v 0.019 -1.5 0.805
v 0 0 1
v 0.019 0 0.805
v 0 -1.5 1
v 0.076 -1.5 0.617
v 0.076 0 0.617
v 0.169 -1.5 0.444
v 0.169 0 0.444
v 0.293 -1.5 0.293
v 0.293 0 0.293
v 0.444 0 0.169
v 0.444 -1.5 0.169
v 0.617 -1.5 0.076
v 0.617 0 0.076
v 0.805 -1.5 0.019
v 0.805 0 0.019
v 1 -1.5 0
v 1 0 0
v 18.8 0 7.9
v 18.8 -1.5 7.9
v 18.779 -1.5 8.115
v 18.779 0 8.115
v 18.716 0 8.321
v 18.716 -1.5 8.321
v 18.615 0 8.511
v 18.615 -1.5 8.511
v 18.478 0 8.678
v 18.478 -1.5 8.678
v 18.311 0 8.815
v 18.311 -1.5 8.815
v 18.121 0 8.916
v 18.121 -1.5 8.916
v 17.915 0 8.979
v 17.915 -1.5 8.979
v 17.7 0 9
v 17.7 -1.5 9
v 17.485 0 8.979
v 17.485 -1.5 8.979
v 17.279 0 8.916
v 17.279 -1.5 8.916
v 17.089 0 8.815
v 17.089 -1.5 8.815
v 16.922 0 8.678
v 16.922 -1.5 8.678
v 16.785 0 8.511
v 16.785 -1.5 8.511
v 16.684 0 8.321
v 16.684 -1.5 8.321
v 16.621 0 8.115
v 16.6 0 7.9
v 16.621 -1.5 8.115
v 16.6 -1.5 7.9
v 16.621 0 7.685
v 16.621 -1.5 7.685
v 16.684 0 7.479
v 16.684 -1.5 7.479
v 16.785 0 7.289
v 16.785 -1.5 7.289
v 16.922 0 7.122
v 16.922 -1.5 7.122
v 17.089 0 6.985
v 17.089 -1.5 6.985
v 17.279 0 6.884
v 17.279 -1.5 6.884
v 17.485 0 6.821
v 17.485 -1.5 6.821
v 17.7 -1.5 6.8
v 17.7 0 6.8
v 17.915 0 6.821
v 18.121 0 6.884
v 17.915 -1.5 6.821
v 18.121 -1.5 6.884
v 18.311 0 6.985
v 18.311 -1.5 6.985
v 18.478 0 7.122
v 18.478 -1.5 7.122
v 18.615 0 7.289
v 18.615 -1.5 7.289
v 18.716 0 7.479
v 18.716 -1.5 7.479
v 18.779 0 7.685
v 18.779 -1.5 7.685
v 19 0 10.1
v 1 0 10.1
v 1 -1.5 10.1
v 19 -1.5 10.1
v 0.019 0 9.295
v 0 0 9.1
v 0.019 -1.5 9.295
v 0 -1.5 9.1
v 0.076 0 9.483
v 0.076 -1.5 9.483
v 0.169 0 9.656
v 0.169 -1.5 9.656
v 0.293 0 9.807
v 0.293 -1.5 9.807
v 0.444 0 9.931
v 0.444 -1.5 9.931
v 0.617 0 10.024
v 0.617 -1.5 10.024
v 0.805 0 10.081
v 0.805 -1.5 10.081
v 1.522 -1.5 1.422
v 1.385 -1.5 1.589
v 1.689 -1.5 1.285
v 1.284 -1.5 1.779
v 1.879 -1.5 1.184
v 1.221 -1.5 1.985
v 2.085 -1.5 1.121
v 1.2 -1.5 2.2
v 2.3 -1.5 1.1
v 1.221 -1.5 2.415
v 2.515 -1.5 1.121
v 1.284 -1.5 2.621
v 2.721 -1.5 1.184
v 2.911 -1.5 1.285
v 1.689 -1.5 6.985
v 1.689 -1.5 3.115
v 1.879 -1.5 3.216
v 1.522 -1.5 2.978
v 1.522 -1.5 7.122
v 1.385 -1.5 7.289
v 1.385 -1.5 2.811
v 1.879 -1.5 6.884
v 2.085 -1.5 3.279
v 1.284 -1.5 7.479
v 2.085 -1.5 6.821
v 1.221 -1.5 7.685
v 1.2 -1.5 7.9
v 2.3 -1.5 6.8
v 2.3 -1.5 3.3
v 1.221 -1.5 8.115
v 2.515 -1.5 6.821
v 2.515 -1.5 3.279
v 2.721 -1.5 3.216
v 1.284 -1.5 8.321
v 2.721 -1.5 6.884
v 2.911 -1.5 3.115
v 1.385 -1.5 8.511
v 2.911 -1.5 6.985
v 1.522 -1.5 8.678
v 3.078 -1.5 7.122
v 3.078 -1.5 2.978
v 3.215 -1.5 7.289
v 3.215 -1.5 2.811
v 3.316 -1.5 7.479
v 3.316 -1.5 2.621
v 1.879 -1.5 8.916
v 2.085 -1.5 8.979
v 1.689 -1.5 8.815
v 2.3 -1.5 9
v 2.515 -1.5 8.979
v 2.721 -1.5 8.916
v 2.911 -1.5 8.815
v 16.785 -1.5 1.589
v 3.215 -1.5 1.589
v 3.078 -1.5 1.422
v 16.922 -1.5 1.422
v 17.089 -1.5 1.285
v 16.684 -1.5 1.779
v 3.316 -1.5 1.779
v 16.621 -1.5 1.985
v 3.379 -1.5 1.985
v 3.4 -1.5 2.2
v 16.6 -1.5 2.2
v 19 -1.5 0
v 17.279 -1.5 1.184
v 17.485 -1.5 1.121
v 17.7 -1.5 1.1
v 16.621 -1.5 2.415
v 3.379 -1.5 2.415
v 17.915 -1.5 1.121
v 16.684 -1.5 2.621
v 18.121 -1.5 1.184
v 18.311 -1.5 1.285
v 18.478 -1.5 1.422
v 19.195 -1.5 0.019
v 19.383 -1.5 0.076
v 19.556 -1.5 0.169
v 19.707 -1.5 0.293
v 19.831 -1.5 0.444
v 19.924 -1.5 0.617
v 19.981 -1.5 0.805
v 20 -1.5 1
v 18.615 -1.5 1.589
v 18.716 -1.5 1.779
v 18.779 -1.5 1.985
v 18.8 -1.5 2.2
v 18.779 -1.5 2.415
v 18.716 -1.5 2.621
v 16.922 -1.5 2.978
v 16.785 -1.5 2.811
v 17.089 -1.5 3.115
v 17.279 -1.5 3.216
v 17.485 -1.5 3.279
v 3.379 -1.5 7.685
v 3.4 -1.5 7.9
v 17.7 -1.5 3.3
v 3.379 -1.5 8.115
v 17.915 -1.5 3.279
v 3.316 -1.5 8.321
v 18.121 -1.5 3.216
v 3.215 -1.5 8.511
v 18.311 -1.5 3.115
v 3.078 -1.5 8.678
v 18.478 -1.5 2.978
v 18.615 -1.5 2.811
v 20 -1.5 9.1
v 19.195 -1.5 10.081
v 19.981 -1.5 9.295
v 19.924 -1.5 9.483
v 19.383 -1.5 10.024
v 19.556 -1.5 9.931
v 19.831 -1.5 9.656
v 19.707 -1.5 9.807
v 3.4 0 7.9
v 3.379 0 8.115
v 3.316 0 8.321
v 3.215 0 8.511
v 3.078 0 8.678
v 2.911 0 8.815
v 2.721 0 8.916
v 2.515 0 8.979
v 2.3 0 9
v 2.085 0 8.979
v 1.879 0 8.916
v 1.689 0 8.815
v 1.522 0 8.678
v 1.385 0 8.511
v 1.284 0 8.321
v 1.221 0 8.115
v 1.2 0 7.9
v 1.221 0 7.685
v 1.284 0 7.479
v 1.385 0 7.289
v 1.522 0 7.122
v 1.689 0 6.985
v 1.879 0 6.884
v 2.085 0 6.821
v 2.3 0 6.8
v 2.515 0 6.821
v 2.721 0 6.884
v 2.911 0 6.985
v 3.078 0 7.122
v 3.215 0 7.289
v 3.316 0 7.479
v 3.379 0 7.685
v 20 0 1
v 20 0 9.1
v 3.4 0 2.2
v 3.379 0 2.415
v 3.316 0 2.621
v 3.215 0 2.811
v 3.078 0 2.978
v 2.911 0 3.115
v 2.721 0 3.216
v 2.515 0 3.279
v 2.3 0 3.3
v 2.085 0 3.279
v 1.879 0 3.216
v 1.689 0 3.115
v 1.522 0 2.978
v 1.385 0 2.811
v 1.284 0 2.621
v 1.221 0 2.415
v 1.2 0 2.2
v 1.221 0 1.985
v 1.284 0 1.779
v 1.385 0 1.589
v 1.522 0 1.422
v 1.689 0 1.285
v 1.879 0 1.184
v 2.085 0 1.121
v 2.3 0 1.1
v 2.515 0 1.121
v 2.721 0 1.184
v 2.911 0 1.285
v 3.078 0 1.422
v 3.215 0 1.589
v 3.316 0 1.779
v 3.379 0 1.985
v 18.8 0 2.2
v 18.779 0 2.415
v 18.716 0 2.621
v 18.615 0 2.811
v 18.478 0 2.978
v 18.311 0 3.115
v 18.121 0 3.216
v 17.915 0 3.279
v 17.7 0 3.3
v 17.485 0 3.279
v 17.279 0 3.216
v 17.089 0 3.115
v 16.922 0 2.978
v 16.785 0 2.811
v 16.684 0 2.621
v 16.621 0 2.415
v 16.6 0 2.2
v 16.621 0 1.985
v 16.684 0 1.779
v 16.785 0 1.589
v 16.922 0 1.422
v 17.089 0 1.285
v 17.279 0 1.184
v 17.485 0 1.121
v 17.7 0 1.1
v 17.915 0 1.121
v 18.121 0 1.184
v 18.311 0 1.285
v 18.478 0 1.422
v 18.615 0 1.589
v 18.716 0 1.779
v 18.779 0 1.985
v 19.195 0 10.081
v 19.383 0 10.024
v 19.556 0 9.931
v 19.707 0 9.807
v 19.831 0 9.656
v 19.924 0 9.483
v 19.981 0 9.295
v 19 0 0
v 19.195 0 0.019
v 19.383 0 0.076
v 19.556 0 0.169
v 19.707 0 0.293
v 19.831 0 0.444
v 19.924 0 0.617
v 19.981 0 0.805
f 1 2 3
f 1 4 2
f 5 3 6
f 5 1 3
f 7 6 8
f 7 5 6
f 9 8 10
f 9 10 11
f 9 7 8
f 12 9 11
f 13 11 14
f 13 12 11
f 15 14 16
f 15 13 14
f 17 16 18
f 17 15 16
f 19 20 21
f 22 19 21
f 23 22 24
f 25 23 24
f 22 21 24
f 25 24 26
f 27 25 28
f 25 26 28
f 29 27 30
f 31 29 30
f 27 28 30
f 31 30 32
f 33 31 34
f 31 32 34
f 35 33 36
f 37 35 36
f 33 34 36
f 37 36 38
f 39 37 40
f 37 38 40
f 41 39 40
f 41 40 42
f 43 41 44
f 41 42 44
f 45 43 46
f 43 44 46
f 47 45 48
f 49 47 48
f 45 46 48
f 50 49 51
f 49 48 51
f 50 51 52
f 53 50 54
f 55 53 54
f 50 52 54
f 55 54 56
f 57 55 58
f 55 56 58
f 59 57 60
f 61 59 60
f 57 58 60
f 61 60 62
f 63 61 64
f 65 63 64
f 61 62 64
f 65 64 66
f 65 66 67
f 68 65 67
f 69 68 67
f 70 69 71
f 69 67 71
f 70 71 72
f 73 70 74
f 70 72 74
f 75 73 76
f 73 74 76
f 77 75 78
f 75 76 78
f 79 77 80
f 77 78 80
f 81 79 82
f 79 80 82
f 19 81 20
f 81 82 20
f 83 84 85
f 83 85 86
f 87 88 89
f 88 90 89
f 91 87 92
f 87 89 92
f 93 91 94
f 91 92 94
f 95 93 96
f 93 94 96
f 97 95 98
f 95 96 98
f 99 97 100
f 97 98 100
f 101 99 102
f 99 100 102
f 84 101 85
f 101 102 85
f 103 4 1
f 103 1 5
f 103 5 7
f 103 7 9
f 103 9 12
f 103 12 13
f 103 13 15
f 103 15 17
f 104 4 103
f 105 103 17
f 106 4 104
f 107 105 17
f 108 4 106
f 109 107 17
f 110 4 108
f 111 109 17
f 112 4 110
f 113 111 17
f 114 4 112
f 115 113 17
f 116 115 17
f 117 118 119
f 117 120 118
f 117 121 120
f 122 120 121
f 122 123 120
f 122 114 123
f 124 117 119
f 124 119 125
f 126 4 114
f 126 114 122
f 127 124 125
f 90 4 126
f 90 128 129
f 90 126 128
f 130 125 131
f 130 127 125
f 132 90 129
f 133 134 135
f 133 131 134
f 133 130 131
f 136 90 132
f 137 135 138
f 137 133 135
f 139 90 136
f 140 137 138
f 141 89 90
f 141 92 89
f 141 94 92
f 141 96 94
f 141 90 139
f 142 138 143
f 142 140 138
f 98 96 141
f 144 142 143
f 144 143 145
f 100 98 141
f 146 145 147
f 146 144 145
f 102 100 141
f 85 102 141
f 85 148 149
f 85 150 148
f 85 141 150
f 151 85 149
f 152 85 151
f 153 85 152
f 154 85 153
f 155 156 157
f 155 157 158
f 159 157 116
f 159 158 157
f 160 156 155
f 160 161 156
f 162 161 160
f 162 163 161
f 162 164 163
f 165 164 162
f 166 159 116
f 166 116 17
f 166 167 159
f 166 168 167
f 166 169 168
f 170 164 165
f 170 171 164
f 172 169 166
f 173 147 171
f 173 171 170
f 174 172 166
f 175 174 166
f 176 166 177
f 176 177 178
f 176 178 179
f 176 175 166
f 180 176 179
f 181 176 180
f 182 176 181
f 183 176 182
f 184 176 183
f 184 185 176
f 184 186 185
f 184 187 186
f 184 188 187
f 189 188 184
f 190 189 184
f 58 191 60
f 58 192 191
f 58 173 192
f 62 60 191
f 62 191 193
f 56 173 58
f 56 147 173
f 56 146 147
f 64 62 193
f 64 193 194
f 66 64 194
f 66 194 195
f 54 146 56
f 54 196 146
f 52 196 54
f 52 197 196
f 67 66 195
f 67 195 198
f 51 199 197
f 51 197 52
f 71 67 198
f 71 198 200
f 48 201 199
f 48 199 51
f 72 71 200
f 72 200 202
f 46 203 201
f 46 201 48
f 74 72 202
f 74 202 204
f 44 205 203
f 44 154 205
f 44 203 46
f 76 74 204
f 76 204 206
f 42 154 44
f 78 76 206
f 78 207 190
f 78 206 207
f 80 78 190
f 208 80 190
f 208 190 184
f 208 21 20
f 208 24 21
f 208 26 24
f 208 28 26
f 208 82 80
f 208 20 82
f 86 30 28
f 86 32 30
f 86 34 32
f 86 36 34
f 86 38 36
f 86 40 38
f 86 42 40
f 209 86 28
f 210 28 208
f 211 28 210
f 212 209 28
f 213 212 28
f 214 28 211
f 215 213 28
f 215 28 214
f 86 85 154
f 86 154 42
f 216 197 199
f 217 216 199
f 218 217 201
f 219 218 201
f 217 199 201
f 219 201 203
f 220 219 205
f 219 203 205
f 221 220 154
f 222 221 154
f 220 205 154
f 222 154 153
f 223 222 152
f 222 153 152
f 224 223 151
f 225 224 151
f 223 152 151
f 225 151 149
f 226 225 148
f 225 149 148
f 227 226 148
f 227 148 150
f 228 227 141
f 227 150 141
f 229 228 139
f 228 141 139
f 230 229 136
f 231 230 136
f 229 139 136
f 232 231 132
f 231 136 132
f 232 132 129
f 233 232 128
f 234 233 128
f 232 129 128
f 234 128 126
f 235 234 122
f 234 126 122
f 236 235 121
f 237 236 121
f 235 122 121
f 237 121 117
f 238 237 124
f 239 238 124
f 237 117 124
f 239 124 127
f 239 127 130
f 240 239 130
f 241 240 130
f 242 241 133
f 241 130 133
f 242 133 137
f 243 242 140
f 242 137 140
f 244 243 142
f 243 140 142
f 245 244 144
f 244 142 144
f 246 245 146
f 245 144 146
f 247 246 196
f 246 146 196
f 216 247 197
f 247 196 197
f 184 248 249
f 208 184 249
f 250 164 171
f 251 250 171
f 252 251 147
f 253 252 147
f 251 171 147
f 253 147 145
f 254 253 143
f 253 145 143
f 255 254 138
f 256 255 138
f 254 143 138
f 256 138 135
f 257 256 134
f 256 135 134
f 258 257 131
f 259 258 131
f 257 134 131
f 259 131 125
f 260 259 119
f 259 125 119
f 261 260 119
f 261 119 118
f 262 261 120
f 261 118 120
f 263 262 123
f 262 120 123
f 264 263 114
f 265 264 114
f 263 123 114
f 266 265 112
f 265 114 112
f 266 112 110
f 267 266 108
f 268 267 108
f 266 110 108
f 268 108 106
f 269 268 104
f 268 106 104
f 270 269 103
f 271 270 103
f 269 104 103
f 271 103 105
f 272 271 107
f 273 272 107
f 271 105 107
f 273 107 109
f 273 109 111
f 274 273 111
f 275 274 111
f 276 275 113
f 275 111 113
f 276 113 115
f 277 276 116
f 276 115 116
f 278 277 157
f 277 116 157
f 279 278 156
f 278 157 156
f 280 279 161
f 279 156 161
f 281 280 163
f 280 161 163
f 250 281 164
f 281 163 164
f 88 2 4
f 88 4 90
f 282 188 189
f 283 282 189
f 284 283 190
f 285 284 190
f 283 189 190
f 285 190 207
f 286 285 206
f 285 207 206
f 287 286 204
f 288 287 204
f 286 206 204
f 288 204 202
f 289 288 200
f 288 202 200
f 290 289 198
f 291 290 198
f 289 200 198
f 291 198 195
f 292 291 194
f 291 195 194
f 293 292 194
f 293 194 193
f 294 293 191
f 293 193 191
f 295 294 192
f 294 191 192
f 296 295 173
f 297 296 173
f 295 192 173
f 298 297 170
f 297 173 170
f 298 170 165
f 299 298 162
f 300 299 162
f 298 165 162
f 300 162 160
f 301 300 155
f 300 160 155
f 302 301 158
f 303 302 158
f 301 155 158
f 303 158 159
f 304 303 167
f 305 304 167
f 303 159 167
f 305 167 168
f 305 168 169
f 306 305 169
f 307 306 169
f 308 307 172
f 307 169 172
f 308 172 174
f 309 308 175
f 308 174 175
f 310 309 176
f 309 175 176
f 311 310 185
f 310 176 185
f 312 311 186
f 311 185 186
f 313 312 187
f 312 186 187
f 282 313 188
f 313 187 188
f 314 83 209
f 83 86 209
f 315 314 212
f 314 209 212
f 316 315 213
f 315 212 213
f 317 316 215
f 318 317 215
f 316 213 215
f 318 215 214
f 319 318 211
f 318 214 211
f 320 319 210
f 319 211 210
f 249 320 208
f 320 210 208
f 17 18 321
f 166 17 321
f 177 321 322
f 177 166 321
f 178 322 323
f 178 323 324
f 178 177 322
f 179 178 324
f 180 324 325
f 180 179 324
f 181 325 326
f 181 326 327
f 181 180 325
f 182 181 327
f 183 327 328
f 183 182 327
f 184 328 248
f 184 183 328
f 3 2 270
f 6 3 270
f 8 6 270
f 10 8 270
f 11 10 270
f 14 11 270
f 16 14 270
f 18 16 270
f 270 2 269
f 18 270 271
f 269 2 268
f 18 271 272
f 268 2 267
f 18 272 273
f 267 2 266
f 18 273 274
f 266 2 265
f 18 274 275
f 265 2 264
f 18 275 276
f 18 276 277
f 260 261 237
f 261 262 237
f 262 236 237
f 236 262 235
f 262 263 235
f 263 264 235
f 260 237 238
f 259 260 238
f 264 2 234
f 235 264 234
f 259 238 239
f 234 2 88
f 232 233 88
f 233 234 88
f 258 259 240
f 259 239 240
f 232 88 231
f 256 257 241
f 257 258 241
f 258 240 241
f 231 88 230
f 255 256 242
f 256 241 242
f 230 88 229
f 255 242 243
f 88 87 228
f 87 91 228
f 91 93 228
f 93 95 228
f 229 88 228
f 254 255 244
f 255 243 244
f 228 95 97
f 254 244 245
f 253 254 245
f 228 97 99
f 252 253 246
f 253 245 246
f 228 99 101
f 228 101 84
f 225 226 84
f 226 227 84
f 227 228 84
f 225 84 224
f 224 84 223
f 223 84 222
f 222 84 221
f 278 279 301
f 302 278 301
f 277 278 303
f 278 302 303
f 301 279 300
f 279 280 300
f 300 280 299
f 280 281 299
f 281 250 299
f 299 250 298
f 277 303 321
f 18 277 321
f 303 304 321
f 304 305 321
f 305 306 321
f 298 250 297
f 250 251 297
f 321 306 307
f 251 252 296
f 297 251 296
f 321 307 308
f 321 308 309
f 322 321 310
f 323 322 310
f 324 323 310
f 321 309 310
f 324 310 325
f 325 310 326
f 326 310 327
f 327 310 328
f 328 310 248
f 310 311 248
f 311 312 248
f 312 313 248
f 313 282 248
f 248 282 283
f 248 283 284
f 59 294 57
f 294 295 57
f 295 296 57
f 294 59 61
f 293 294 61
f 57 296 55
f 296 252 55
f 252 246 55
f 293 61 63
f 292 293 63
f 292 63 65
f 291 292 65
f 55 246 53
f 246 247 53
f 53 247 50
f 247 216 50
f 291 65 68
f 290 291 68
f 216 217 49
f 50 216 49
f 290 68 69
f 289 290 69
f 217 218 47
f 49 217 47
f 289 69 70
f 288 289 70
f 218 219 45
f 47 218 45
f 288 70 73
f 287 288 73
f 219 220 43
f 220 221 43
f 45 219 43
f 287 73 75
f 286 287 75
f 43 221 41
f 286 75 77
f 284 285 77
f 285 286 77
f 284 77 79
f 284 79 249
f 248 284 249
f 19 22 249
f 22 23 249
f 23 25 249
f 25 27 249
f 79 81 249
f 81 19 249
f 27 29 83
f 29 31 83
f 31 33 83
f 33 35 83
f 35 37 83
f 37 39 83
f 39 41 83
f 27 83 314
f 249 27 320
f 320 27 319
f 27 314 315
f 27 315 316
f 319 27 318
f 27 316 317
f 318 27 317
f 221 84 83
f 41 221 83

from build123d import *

# Parameters (mm, degrees)
F0_W     = 20
F0_H     = 10.1
F1_DEPTH = 1.5
F2_R     = 1.1
F3_DEPTH = 1.5
F4_R     = 1


with BuildPart() as f1:
    # F0 (on Front) → F1 (new body)
    with BuildSketch(Plane.XZ):
        with Locations((10, 5.05)):
            Rectangle(F0_W, F0_H)
    extrude(amount=F1_DEPTH)

    # F2 (on face) → F3 (cut, through all)
    with BuildSketch(Plane.XZ.offset(1.5)):
        with Locations((2.3, 7.9)):
            Circle(F2_R)
        with Locations((17.7, 7.9)):
            Circle(F2_R)
        with Locations((2.3, 2.2)):
            Circle(F2_R)
        with Locations((17.7, 2.2)):
            Circle(F2_R)
    extrude(amount=-F3_DEPTH, mode=Mode.SUBTRACT)

    # F4
    f4_edges = [f1.edges().sort_by_distance(p)[0] for p in [
        (20, -0.75, 10.1),
        (20, -0.75, 0),
        (0, -0.75, 10.1),
        (0, -0.75, 0),
    ]]
    fillet(f4_edges, radius=F4_R)


solid = f1.part
